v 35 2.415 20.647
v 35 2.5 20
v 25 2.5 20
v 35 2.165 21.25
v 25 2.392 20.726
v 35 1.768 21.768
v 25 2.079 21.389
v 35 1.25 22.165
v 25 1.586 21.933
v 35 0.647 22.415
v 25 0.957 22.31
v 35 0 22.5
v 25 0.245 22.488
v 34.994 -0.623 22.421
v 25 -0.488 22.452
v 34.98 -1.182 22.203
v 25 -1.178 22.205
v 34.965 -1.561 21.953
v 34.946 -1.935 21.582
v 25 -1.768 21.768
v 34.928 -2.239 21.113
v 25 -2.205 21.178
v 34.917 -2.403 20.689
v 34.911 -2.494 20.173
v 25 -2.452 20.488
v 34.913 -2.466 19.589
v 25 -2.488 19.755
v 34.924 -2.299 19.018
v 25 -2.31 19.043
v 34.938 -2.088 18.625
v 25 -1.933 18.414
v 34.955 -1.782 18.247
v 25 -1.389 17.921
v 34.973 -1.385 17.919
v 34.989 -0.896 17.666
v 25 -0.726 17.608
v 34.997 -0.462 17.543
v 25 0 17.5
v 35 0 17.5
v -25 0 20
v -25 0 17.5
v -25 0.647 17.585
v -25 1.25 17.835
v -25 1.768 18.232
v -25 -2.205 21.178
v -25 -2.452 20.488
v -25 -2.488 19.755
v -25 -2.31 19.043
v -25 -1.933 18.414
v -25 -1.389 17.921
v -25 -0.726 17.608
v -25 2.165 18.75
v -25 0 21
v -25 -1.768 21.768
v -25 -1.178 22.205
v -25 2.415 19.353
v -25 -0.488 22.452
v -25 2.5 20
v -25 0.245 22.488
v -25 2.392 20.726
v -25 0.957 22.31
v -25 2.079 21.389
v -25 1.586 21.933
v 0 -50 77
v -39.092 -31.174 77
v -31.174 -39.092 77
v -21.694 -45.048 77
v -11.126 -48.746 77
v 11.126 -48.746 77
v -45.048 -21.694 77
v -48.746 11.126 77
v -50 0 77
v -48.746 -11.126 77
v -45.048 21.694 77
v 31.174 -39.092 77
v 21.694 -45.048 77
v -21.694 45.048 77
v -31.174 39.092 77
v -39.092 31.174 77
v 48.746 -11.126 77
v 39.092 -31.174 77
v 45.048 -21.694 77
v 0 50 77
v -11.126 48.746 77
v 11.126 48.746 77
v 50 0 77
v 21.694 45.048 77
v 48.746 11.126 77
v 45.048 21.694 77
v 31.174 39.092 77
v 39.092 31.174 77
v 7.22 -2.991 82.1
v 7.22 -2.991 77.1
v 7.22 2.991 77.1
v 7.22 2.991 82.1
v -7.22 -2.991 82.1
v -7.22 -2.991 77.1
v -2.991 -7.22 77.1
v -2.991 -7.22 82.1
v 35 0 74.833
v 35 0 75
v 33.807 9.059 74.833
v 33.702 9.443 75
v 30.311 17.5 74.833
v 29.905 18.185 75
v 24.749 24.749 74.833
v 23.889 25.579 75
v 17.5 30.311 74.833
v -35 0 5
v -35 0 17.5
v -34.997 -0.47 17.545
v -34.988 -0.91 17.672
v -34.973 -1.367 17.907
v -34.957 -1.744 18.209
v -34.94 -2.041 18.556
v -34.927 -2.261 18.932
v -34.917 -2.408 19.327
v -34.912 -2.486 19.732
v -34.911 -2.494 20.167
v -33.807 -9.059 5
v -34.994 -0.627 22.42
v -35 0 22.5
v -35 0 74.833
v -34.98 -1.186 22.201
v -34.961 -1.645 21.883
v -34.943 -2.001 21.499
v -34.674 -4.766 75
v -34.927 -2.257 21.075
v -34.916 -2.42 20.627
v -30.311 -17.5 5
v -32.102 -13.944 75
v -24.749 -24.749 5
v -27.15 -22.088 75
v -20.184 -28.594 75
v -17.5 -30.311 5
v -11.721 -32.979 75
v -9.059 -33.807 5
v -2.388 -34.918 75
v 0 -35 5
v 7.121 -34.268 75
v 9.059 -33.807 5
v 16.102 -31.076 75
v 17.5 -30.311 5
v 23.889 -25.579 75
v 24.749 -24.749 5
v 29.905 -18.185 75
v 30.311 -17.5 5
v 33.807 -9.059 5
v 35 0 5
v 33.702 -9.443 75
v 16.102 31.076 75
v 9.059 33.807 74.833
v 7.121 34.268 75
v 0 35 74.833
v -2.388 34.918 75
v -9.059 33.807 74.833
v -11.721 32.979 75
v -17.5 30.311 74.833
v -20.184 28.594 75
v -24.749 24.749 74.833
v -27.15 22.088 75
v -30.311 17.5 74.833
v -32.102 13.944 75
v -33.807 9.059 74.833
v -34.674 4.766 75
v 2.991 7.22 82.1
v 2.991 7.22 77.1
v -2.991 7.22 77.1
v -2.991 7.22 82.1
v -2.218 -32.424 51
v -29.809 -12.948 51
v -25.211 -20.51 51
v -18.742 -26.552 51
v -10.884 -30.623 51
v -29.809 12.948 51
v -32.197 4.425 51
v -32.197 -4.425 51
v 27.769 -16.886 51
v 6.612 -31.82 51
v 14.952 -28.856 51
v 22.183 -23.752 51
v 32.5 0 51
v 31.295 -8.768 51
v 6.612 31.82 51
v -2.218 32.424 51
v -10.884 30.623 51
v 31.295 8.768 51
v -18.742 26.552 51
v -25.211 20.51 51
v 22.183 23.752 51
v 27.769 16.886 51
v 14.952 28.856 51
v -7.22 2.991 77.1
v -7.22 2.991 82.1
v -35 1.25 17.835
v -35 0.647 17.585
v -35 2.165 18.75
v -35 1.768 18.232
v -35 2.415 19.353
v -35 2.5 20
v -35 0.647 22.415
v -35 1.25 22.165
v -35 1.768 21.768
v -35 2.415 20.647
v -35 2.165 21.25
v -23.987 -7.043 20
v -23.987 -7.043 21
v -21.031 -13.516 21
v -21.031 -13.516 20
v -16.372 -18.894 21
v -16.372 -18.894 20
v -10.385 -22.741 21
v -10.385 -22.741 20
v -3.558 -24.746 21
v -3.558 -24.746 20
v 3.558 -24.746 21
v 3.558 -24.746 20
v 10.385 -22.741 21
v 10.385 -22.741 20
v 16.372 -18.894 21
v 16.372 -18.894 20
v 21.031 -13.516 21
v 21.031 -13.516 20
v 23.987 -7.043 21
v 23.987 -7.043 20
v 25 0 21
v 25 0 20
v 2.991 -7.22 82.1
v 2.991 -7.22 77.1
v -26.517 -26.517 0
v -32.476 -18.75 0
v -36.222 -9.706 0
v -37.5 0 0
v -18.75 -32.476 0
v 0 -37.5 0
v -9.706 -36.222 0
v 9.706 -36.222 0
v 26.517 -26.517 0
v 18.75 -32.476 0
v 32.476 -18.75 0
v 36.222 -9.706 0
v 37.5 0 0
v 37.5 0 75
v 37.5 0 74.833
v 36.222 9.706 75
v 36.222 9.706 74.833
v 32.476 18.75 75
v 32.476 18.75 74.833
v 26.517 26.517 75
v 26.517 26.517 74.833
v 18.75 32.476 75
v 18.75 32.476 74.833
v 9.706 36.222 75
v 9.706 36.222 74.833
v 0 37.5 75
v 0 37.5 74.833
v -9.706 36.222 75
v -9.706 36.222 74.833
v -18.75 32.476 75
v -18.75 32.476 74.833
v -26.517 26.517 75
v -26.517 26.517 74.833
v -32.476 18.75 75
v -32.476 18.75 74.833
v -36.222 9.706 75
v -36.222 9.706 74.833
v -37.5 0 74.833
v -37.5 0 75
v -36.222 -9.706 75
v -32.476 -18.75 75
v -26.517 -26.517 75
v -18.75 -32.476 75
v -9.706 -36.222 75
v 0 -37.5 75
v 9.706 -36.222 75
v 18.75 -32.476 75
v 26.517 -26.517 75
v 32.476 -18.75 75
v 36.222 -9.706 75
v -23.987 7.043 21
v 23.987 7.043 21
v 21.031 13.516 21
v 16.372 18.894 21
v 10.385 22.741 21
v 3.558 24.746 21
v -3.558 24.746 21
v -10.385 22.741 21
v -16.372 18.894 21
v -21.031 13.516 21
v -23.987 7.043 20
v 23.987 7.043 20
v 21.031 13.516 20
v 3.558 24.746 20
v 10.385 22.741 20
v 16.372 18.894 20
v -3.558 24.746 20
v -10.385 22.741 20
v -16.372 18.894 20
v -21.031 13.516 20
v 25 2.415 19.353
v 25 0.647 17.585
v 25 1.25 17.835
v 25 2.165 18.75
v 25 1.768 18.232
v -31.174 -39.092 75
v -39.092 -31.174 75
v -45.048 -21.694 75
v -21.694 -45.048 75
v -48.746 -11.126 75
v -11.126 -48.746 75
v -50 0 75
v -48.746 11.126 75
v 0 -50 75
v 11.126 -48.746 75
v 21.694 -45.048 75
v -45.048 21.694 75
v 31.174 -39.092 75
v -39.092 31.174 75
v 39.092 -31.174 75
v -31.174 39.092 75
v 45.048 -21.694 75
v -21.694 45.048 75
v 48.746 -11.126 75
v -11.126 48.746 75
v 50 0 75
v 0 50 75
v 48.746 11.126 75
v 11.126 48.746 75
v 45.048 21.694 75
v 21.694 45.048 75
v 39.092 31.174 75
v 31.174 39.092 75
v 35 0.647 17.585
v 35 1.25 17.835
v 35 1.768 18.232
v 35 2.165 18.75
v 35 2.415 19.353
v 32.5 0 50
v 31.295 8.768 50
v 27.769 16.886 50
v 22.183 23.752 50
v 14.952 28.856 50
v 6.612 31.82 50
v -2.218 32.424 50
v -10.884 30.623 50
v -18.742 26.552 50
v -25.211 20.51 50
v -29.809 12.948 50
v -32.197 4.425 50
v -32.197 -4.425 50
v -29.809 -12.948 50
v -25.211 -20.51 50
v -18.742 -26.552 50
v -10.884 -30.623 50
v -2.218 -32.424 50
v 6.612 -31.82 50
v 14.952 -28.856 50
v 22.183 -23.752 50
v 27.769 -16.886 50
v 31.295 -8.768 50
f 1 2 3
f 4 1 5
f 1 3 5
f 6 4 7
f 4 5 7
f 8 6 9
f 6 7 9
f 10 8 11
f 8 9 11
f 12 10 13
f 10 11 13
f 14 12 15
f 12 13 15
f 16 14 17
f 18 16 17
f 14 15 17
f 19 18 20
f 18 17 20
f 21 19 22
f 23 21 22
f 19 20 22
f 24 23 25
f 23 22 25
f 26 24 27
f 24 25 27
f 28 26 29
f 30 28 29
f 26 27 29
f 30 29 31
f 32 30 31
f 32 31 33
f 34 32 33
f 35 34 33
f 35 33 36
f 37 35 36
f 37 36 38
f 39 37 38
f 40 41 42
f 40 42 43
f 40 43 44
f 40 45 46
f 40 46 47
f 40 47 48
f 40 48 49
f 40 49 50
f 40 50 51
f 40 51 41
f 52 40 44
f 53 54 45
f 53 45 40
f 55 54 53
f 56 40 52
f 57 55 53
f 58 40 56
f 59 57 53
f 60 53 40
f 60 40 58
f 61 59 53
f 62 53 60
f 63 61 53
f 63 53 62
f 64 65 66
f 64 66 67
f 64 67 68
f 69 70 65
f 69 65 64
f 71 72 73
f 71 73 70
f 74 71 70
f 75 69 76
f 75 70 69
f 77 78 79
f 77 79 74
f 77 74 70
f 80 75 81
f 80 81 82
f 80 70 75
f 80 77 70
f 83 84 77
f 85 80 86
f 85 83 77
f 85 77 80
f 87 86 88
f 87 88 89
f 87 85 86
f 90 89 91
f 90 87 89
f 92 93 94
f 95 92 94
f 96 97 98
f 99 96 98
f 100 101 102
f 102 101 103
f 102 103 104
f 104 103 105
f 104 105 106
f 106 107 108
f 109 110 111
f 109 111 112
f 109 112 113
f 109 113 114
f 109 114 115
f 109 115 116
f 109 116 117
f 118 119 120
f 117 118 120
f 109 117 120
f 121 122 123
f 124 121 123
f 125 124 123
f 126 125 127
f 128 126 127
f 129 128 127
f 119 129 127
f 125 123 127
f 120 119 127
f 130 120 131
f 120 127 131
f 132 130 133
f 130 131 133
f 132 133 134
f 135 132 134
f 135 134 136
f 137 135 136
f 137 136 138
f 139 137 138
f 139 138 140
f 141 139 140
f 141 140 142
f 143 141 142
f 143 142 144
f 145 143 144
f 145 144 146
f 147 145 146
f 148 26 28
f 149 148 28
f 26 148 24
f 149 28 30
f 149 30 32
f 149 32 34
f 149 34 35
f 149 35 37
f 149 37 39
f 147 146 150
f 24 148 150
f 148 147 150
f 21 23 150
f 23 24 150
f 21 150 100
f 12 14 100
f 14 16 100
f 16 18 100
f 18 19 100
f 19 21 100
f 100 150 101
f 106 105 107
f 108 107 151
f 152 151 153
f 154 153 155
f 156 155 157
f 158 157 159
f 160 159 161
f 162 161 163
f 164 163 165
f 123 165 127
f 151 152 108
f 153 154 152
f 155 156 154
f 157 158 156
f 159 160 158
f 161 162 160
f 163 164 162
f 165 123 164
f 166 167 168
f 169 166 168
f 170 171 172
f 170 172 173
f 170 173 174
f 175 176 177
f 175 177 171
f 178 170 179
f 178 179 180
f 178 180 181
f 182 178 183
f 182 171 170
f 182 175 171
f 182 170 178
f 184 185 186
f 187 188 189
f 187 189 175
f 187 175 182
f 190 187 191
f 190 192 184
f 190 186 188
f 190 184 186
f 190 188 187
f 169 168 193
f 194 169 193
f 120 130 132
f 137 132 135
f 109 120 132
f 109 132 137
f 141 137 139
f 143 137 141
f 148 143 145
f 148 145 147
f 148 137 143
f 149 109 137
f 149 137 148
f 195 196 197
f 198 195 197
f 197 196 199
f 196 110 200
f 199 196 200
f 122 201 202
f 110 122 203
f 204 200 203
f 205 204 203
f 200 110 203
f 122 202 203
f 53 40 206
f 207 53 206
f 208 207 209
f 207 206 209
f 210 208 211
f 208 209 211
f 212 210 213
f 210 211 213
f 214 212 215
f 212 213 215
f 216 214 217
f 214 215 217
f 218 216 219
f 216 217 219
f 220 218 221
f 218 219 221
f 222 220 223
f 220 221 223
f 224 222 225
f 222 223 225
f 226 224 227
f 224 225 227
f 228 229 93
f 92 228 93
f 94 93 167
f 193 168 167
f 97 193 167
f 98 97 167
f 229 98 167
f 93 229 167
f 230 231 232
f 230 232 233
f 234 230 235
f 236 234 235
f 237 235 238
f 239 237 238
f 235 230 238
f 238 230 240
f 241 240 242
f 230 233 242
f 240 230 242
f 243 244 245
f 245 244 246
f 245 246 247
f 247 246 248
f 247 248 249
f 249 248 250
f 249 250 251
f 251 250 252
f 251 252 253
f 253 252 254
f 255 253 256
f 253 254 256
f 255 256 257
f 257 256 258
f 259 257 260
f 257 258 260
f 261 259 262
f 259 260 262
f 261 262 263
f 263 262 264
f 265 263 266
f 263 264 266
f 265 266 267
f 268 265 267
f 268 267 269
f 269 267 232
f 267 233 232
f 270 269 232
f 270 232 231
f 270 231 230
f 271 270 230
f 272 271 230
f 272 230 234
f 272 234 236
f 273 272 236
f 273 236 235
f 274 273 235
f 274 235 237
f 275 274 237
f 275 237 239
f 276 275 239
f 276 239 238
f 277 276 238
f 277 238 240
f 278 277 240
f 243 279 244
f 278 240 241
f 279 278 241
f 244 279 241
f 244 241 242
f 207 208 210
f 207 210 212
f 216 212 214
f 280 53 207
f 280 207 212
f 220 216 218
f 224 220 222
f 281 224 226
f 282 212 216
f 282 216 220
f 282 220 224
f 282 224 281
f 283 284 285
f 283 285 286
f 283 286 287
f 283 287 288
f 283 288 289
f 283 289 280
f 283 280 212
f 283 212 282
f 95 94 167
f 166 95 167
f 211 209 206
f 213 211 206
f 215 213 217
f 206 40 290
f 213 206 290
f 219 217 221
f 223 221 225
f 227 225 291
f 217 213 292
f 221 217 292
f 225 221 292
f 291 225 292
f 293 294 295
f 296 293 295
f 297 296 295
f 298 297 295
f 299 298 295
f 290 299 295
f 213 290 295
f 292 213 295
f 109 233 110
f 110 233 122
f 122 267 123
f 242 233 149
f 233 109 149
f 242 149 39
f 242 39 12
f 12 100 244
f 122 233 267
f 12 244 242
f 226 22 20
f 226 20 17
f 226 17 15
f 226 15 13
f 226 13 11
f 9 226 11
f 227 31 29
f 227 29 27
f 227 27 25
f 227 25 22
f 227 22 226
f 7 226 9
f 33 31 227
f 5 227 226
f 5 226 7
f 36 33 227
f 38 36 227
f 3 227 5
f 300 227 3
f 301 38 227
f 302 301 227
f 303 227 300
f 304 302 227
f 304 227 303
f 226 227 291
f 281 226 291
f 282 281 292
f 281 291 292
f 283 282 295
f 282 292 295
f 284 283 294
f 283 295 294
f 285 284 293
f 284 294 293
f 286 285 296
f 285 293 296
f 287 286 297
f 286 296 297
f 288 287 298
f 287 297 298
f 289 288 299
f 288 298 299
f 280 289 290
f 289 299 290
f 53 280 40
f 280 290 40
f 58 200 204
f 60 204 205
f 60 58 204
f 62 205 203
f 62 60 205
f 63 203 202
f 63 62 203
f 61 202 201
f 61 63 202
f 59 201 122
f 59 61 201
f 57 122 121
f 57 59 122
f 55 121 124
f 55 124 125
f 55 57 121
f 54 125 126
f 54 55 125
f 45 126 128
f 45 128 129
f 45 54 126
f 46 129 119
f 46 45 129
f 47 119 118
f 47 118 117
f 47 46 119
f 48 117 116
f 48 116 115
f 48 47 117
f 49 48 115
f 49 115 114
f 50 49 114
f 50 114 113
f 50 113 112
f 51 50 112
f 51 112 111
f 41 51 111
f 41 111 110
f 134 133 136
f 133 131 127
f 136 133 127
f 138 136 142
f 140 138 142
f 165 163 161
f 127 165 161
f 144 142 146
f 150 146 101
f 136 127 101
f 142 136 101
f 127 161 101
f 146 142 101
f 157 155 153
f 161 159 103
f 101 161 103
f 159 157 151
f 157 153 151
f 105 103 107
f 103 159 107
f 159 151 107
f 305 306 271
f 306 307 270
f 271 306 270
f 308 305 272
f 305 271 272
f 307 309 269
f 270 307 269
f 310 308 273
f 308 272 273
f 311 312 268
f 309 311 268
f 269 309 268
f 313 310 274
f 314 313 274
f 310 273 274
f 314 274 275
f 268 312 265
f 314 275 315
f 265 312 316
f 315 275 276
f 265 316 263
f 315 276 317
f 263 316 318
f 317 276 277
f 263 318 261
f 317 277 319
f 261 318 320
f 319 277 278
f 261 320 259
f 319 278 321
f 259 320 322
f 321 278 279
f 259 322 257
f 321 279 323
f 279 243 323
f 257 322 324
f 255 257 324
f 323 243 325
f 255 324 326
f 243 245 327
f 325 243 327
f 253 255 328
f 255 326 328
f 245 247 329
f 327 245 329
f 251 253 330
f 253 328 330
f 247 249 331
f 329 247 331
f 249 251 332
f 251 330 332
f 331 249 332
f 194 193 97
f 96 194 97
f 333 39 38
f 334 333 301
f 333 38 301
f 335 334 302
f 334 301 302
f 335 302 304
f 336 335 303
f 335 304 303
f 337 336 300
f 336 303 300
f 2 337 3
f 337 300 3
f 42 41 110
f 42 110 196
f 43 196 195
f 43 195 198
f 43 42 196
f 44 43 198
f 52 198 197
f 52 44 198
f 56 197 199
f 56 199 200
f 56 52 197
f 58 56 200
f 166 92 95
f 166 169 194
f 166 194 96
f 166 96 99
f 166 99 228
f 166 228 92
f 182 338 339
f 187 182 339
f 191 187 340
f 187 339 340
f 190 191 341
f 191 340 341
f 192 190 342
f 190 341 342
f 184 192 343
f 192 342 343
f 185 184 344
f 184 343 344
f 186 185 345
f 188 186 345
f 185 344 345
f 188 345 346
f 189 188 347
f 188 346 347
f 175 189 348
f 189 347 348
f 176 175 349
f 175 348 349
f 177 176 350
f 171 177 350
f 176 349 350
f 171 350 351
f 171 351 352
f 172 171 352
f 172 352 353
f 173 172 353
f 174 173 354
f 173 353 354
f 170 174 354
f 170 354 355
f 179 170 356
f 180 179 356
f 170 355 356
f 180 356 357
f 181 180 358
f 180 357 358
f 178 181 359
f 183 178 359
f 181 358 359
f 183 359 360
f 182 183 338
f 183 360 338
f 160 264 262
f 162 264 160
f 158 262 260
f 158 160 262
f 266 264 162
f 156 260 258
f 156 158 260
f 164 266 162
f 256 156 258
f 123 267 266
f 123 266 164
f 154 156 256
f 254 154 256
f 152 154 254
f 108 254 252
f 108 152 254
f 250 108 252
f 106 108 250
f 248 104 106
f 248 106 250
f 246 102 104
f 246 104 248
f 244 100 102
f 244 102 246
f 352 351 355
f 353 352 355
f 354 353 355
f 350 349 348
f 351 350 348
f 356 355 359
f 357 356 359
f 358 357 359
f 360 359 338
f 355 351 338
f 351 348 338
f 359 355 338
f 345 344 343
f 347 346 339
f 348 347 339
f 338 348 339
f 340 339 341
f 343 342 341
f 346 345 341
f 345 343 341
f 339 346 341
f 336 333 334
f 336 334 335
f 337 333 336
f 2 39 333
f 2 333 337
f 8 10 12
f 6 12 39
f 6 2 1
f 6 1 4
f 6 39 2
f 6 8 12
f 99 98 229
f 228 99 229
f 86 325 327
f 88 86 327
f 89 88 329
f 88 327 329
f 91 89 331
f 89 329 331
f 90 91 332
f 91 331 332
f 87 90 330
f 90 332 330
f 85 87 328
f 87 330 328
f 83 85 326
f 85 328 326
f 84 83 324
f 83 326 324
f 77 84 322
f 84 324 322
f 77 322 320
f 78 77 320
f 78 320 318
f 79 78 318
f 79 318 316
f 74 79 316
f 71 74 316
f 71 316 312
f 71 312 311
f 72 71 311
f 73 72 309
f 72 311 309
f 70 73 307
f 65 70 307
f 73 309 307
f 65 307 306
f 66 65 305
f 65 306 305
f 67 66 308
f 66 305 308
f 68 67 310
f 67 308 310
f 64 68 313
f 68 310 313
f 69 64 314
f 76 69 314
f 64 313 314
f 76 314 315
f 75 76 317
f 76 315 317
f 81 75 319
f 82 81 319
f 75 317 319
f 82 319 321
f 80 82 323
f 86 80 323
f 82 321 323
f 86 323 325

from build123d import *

# Parameters (mm, degrees)
F0_R      = 37.5
F1_DEPTH  = 75
F2_R      = 35
F3_DEPTH  = 70
F4_W      = 148.646176
F4_H      = 74.832693
F5_DEPTH  = 46
F7_DEPTH  = 35
F7_FACE_R = 2.5
F8_DEPTH  = 25
F9_DEPTH  = 35
F10_DEPTH = 25
F12_R     = 25
F13_DEPTH = 1
F15_R     = 32.5
F16_DEPTH = 1
F17_R     = 50
F18_DEPTH = 2
F21_DEPTH = 5


with BuildPart() as f1:
    # F0 (on Top) → F1 (new body)
    with BuildSketch(Plane.XY):
        Circle(F0_R)
    extrude(amount=F1_DEPTH)

    # F2 (on face) → F3 (cut)
    with BuildSketch(Plane.XY.offset(75)):
        Circle(F2_R)
    extrude(amount=-F3_DEPTH, mode=Mode.SUBTRACT)

    # F4 (on Front) → F5 (cut)
    with BuildSketch(Plane.XZ):
        with Locations((0.537515, 37.416346)):
            Rectangle(F4_W, F4_H)
    extrude(amount=-F5_DEPTH, mode=Mode.SUBTRACT)

    # F6 (on Right) → F7 (join)
    with BuildSketch(Plane.YZ):
        with BuildLine():
            ThreePointArc((0, 17.5), (1.767767, 18.232233), (2.5, 20))
            ThreePointArc((2.5, 20), (-1.767767, 21.767767), (0, 17.5))
        make_face()
    extrude(amount=F7_DEPTH)

    # F7_face (on face) → F8 (cut)
    with BuildSketch(Plane(origin=(0, 0, 20), x_dir=(0, 1, 0), z_dir=(-1, 0, 0))):
        Circle(F7_FACE_R)
    extrude(amount=-F8_DEPTH, mode=Mode.SUBTRACT)

    # F6 (on Right) → F9 (join)
    with BuildSketch(Plane.YZ):
        with BuildLine():
            ThreePointArc((0, 17.5), (1.767767, 18.232233), (2.5, 20))
            ThreePointArc((2.5, 20), (-1.767767, 21.767767), (0, 17.5))
        make_face()
    extrude(amount=-F9_DEPTH)

    # F6 (on Right) → F10 (cut)
    with BuildSketch(Plane.YZ):
        with BuildLine():
            ThreePointArc((0, 17.5), (1.767767, 18.232233), (2.5, 20))
            ThreePointArc((2.5, 20), (-1.767767, 21.767767), (0, 17.5))
        make_face()
    extrude(amount=-F10_DEPTH, mode=Mode.SUBTRACT)

    # F12 (on offset) → F13 (join)
    with BuildSketch(Plane.XY.offset(20)):
        Circle(F12_R)
    extrude(amount=F13_DEPTH)

    # F17 (on face) → F18 (join)
    with BuildSketch(Plane.XY.offset(75)):
        Circle(F17_R)
    extrude(amount=F18_DEPTH)


with BuildPart() as f16:
    # F15 (on offset) → F16 (new body)
    with BuildSketch(Plane.XY.offset(50)):
        Circle(F15_R)
    extrude(amount=F16_DEPTH)


with BuildPart() as f21:
    # F20 (on offset) → F21 (new body)
    with BuildSketch(Plane.XY.offset(77.1)):
        Polygon((7.219949, -2.990601), (7.219949, 2.990601), (2.990601, 7.219949), (-2.990601, 7.219949), (-7.219949, 2.990601), (-7.219949, -2.990601), (-2.990601, -7.219949), (2.990601, -7.219949), align=None)
    extrude(amount=F21_DEPTH)


solid = Compound([f1.part, f16.part, f21.part])
